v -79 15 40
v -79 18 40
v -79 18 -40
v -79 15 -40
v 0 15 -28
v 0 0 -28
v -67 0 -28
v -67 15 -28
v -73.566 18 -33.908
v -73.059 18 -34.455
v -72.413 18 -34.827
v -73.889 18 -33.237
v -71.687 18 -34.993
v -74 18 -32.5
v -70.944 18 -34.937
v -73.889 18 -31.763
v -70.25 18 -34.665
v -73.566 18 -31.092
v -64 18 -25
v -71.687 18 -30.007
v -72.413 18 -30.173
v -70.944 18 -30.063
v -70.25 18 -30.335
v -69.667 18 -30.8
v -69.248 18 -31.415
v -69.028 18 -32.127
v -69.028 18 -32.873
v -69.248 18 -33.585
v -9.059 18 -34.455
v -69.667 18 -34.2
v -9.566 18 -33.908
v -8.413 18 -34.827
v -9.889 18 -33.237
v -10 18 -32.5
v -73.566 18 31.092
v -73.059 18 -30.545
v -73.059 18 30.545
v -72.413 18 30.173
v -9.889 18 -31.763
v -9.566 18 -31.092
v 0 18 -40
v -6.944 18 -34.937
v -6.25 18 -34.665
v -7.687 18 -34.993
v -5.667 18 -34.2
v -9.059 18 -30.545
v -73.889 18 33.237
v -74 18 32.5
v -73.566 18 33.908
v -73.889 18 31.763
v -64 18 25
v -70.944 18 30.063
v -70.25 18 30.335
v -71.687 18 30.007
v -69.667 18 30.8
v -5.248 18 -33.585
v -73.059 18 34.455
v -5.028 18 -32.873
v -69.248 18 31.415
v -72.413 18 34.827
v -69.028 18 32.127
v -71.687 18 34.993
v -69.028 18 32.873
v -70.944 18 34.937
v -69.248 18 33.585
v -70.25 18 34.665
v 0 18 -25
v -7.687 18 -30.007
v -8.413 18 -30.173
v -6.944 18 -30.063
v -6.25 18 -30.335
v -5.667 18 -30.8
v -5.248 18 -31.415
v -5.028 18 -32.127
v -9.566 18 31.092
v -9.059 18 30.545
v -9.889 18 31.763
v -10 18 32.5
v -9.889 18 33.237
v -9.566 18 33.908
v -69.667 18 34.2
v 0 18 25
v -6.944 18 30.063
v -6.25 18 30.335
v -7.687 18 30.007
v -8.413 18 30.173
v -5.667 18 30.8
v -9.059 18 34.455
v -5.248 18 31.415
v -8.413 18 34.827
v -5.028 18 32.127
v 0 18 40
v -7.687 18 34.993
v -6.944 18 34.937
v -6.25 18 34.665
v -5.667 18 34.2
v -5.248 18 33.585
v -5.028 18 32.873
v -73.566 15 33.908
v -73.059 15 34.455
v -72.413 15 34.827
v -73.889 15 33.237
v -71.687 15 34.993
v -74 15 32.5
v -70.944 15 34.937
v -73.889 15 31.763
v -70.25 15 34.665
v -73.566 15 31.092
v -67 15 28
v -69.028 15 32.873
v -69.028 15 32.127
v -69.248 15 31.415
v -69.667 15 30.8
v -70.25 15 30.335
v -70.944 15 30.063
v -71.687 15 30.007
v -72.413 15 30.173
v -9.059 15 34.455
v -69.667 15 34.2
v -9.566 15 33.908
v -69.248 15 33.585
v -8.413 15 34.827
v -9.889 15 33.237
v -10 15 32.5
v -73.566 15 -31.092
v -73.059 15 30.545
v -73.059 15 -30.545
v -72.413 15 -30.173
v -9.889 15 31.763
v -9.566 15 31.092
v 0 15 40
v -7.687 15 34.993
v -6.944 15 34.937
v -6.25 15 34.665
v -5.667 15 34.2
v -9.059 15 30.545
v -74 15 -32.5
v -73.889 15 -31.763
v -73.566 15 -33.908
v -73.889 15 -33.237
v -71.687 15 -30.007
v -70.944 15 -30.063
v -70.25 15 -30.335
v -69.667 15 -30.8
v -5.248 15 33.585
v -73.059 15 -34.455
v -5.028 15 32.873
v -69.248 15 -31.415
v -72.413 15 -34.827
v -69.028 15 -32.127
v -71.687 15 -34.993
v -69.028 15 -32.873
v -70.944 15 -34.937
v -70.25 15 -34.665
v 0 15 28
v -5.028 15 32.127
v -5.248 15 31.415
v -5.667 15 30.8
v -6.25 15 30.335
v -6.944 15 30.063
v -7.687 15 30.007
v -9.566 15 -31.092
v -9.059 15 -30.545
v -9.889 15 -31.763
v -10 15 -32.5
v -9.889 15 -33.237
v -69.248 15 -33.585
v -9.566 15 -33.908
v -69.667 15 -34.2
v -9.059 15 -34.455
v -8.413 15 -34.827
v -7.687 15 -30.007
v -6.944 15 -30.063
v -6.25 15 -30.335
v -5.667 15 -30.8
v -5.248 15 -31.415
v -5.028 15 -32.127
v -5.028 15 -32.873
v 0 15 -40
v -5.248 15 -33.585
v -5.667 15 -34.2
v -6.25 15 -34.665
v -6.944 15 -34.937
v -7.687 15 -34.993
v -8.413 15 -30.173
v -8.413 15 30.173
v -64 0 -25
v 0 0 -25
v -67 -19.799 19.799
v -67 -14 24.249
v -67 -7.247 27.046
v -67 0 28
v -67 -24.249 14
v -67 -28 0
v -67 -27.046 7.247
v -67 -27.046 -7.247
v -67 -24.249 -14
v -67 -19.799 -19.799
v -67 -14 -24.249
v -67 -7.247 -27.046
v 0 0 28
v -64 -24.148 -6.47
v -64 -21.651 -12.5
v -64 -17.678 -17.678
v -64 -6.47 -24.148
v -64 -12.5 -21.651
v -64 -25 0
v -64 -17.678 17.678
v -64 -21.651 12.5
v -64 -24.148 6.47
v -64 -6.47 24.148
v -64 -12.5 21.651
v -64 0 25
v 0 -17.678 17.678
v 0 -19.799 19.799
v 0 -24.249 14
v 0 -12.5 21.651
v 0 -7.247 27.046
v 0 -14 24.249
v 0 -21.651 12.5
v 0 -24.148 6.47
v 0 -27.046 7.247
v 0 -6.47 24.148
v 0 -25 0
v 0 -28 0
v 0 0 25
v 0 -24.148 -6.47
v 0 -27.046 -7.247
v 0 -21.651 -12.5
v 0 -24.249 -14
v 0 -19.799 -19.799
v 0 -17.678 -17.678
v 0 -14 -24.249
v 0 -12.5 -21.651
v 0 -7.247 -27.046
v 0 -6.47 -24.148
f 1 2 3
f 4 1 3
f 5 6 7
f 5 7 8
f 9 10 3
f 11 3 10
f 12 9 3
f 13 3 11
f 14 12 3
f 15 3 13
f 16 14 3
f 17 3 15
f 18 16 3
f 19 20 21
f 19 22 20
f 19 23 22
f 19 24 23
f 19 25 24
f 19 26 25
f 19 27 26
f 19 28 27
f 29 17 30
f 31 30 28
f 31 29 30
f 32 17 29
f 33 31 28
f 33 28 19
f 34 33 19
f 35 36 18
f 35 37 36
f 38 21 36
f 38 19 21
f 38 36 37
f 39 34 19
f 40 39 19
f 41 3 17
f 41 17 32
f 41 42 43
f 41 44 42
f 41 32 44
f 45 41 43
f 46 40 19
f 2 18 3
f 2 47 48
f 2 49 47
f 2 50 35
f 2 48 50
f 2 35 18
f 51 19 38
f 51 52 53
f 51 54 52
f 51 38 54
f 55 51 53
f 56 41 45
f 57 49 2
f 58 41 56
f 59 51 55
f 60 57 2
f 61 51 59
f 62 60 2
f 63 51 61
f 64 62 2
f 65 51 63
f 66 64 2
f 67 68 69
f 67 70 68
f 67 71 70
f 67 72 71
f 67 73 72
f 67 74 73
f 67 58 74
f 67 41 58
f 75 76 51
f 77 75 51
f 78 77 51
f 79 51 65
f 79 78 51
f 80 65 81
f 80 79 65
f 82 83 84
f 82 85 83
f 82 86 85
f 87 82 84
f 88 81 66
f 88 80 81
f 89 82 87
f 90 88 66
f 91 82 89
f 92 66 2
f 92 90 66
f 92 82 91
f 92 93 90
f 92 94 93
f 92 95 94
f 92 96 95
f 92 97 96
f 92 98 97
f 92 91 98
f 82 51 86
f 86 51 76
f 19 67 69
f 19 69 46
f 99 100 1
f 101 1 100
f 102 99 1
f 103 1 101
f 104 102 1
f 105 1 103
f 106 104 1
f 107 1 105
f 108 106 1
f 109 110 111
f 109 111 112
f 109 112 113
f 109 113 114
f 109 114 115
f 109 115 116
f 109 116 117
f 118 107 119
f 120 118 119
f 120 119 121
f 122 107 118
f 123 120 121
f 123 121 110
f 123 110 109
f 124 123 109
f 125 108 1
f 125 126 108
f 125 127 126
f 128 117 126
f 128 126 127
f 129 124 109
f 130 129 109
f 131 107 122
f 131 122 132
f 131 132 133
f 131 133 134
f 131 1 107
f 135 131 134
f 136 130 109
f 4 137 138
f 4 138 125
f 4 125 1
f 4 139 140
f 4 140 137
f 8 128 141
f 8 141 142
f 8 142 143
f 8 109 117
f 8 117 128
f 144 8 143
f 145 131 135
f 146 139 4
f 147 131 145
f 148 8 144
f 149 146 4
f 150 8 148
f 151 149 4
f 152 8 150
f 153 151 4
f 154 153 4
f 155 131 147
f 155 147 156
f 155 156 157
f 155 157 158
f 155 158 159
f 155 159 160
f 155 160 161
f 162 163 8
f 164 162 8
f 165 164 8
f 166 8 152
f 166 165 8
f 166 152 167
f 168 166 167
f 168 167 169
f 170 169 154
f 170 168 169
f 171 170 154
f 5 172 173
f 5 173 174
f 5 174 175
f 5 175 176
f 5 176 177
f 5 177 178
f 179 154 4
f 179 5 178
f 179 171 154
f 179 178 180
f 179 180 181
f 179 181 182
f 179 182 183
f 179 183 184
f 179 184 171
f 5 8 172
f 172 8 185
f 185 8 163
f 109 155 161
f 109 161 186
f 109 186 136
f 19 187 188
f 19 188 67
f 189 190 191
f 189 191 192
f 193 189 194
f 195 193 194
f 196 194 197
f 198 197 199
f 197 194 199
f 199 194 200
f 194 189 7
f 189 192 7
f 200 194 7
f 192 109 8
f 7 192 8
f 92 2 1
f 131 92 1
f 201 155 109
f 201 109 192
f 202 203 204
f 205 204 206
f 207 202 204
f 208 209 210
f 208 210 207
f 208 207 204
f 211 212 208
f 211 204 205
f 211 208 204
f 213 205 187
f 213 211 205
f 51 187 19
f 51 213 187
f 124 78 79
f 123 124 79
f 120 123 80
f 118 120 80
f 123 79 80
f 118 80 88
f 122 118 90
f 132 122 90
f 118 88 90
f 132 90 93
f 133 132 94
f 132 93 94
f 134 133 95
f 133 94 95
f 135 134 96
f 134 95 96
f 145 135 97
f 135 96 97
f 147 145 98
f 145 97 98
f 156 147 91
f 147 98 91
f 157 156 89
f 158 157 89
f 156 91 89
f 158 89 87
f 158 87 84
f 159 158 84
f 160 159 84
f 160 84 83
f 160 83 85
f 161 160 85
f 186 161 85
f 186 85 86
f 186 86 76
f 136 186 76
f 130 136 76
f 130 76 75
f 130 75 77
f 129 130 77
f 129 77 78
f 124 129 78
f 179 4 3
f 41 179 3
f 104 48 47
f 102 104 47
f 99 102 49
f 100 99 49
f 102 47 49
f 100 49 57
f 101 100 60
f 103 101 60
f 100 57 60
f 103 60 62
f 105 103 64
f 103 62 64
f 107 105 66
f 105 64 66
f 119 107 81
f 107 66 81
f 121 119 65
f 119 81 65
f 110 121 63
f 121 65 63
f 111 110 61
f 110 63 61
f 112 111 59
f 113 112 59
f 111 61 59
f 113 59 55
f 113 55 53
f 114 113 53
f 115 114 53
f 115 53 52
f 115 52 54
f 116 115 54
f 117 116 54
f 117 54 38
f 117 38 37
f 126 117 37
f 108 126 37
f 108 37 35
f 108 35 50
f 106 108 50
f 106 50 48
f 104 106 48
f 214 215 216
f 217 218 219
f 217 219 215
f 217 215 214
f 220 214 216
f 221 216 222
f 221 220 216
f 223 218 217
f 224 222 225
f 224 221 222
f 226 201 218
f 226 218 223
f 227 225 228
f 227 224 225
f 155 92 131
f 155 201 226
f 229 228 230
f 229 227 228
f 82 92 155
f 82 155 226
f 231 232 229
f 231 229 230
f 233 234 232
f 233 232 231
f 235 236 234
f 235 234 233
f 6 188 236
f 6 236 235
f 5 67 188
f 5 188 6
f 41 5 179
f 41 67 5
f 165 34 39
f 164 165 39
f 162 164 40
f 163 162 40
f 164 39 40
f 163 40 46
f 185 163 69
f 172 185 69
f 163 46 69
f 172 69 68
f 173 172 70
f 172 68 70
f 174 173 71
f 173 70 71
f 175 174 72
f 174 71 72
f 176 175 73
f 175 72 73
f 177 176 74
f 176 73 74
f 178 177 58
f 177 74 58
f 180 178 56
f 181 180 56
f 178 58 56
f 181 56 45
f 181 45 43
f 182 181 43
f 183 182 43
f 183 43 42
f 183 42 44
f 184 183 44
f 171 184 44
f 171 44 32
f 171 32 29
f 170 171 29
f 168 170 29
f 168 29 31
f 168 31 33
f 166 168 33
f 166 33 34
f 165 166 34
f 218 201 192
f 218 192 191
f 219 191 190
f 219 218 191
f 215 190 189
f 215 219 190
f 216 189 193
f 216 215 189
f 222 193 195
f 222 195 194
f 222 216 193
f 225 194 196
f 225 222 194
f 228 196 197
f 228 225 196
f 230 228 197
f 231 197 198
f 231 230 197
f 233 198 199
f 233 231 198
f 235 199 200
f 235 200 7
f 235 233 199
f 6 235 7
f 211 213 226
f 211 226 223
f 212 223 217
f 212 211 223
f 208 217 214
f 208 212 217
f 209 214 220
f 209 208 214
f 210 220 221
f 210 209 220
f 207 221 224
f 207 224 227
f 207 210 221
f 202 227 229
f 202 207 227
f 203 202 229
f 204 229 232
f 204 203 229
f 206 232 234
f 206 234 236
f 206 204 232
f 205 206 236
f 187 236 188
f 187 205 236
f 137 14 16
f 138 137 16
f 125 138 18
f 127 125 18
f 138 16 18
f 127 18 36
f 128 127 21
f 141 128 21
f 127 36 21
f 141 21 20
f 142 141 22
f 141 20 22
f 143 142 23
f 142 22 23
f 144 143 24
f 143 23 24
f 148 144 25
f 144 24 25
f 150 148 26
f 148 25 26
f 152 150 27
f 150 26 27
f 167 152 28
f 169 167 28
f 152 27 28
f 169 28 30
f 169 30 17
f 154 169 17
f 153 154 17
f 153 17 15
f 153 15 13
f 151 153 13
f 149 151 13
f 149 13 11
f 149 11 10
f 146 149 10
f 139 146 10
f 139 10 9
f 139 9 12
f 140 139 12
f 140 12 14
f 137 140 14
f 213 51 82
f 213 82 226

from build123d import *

# Parameters (mm, degrees)
TUBE_CLAMP_BASE_EXTRUDE_DEPTH           = 67
TUBE_CLAMP_MOUNTING_PLATE_EXTRUDE_DEPTH = 79
INNER_START                             = -64
INNER_SHELL_DEPTH                       = 64
F_5_0MM_DOWEL_HOLE1_D                   = 5


# Read off the part's stored shape, not the designer's step: Inner Shell
with BuildPart() as part:
    # Tube Clamp Profile → Tube Clamp Base Extrude (new body)
    with BuildSketch(Plane(origin=(0, 0, 0), x_dir=(0, 0, -1), z_dir=(1, 0, 0))):
        with BuildLine():
            Line((-28, 15), (-28, 0))
            ThreePointArc((-28, 0), (0, -28), (28, 0))
            Line((28, 0), (28, 15))
            Line((28, 15), (-28, 15))
        make_face()
    extrude(amount=-TUBE_CLAMP_BASE_EXTRUDE_DEPTH)

    # Sketch1<3> → Tube Clamp Mounting Plate Extrude (add)
    with BuildSketch(Plane(origin=(0, 0, 0), x_dir=(0, 0, -1), z_dir=(1, 0, 0))):
        Polygon((40, 15), (40, 18), (-40, 18), (-40, 15), (-28, 15), (28, 15), align=None)
    extrude(amount=-TUBE_CLAMP_MOUNTING_PLATE_EXTRUDE_DEPTH)

    # Inner Shell outline → Inner Shell (cut)
    with BuildSketch(Plane.YZ.offset(INNER_START)):
        with BuildLine():
            Line((18, -25), (18, 25))
            Line((18, 25), (0, 25))
            ThreePointArc((0, 25), (-25, 0), (0, -25))
            Line((0, -25), (18, -25))
        make_face()
    extrude(amount=INNER_SHELL_DEPTH, mode=Mode.SUBTRACT)

    # Ø5.0mm Dowel Hole1 (through all)
    with Locations(Plane.XZ):
        with Locations((-7.5, -32.5), (-71.5, 32.5), (-7.5, 32.5), (-71.5, -32.5)):
            Hole(F_5_0MM_DOWEL_HOLE1_D / 2)


solid = part.part
